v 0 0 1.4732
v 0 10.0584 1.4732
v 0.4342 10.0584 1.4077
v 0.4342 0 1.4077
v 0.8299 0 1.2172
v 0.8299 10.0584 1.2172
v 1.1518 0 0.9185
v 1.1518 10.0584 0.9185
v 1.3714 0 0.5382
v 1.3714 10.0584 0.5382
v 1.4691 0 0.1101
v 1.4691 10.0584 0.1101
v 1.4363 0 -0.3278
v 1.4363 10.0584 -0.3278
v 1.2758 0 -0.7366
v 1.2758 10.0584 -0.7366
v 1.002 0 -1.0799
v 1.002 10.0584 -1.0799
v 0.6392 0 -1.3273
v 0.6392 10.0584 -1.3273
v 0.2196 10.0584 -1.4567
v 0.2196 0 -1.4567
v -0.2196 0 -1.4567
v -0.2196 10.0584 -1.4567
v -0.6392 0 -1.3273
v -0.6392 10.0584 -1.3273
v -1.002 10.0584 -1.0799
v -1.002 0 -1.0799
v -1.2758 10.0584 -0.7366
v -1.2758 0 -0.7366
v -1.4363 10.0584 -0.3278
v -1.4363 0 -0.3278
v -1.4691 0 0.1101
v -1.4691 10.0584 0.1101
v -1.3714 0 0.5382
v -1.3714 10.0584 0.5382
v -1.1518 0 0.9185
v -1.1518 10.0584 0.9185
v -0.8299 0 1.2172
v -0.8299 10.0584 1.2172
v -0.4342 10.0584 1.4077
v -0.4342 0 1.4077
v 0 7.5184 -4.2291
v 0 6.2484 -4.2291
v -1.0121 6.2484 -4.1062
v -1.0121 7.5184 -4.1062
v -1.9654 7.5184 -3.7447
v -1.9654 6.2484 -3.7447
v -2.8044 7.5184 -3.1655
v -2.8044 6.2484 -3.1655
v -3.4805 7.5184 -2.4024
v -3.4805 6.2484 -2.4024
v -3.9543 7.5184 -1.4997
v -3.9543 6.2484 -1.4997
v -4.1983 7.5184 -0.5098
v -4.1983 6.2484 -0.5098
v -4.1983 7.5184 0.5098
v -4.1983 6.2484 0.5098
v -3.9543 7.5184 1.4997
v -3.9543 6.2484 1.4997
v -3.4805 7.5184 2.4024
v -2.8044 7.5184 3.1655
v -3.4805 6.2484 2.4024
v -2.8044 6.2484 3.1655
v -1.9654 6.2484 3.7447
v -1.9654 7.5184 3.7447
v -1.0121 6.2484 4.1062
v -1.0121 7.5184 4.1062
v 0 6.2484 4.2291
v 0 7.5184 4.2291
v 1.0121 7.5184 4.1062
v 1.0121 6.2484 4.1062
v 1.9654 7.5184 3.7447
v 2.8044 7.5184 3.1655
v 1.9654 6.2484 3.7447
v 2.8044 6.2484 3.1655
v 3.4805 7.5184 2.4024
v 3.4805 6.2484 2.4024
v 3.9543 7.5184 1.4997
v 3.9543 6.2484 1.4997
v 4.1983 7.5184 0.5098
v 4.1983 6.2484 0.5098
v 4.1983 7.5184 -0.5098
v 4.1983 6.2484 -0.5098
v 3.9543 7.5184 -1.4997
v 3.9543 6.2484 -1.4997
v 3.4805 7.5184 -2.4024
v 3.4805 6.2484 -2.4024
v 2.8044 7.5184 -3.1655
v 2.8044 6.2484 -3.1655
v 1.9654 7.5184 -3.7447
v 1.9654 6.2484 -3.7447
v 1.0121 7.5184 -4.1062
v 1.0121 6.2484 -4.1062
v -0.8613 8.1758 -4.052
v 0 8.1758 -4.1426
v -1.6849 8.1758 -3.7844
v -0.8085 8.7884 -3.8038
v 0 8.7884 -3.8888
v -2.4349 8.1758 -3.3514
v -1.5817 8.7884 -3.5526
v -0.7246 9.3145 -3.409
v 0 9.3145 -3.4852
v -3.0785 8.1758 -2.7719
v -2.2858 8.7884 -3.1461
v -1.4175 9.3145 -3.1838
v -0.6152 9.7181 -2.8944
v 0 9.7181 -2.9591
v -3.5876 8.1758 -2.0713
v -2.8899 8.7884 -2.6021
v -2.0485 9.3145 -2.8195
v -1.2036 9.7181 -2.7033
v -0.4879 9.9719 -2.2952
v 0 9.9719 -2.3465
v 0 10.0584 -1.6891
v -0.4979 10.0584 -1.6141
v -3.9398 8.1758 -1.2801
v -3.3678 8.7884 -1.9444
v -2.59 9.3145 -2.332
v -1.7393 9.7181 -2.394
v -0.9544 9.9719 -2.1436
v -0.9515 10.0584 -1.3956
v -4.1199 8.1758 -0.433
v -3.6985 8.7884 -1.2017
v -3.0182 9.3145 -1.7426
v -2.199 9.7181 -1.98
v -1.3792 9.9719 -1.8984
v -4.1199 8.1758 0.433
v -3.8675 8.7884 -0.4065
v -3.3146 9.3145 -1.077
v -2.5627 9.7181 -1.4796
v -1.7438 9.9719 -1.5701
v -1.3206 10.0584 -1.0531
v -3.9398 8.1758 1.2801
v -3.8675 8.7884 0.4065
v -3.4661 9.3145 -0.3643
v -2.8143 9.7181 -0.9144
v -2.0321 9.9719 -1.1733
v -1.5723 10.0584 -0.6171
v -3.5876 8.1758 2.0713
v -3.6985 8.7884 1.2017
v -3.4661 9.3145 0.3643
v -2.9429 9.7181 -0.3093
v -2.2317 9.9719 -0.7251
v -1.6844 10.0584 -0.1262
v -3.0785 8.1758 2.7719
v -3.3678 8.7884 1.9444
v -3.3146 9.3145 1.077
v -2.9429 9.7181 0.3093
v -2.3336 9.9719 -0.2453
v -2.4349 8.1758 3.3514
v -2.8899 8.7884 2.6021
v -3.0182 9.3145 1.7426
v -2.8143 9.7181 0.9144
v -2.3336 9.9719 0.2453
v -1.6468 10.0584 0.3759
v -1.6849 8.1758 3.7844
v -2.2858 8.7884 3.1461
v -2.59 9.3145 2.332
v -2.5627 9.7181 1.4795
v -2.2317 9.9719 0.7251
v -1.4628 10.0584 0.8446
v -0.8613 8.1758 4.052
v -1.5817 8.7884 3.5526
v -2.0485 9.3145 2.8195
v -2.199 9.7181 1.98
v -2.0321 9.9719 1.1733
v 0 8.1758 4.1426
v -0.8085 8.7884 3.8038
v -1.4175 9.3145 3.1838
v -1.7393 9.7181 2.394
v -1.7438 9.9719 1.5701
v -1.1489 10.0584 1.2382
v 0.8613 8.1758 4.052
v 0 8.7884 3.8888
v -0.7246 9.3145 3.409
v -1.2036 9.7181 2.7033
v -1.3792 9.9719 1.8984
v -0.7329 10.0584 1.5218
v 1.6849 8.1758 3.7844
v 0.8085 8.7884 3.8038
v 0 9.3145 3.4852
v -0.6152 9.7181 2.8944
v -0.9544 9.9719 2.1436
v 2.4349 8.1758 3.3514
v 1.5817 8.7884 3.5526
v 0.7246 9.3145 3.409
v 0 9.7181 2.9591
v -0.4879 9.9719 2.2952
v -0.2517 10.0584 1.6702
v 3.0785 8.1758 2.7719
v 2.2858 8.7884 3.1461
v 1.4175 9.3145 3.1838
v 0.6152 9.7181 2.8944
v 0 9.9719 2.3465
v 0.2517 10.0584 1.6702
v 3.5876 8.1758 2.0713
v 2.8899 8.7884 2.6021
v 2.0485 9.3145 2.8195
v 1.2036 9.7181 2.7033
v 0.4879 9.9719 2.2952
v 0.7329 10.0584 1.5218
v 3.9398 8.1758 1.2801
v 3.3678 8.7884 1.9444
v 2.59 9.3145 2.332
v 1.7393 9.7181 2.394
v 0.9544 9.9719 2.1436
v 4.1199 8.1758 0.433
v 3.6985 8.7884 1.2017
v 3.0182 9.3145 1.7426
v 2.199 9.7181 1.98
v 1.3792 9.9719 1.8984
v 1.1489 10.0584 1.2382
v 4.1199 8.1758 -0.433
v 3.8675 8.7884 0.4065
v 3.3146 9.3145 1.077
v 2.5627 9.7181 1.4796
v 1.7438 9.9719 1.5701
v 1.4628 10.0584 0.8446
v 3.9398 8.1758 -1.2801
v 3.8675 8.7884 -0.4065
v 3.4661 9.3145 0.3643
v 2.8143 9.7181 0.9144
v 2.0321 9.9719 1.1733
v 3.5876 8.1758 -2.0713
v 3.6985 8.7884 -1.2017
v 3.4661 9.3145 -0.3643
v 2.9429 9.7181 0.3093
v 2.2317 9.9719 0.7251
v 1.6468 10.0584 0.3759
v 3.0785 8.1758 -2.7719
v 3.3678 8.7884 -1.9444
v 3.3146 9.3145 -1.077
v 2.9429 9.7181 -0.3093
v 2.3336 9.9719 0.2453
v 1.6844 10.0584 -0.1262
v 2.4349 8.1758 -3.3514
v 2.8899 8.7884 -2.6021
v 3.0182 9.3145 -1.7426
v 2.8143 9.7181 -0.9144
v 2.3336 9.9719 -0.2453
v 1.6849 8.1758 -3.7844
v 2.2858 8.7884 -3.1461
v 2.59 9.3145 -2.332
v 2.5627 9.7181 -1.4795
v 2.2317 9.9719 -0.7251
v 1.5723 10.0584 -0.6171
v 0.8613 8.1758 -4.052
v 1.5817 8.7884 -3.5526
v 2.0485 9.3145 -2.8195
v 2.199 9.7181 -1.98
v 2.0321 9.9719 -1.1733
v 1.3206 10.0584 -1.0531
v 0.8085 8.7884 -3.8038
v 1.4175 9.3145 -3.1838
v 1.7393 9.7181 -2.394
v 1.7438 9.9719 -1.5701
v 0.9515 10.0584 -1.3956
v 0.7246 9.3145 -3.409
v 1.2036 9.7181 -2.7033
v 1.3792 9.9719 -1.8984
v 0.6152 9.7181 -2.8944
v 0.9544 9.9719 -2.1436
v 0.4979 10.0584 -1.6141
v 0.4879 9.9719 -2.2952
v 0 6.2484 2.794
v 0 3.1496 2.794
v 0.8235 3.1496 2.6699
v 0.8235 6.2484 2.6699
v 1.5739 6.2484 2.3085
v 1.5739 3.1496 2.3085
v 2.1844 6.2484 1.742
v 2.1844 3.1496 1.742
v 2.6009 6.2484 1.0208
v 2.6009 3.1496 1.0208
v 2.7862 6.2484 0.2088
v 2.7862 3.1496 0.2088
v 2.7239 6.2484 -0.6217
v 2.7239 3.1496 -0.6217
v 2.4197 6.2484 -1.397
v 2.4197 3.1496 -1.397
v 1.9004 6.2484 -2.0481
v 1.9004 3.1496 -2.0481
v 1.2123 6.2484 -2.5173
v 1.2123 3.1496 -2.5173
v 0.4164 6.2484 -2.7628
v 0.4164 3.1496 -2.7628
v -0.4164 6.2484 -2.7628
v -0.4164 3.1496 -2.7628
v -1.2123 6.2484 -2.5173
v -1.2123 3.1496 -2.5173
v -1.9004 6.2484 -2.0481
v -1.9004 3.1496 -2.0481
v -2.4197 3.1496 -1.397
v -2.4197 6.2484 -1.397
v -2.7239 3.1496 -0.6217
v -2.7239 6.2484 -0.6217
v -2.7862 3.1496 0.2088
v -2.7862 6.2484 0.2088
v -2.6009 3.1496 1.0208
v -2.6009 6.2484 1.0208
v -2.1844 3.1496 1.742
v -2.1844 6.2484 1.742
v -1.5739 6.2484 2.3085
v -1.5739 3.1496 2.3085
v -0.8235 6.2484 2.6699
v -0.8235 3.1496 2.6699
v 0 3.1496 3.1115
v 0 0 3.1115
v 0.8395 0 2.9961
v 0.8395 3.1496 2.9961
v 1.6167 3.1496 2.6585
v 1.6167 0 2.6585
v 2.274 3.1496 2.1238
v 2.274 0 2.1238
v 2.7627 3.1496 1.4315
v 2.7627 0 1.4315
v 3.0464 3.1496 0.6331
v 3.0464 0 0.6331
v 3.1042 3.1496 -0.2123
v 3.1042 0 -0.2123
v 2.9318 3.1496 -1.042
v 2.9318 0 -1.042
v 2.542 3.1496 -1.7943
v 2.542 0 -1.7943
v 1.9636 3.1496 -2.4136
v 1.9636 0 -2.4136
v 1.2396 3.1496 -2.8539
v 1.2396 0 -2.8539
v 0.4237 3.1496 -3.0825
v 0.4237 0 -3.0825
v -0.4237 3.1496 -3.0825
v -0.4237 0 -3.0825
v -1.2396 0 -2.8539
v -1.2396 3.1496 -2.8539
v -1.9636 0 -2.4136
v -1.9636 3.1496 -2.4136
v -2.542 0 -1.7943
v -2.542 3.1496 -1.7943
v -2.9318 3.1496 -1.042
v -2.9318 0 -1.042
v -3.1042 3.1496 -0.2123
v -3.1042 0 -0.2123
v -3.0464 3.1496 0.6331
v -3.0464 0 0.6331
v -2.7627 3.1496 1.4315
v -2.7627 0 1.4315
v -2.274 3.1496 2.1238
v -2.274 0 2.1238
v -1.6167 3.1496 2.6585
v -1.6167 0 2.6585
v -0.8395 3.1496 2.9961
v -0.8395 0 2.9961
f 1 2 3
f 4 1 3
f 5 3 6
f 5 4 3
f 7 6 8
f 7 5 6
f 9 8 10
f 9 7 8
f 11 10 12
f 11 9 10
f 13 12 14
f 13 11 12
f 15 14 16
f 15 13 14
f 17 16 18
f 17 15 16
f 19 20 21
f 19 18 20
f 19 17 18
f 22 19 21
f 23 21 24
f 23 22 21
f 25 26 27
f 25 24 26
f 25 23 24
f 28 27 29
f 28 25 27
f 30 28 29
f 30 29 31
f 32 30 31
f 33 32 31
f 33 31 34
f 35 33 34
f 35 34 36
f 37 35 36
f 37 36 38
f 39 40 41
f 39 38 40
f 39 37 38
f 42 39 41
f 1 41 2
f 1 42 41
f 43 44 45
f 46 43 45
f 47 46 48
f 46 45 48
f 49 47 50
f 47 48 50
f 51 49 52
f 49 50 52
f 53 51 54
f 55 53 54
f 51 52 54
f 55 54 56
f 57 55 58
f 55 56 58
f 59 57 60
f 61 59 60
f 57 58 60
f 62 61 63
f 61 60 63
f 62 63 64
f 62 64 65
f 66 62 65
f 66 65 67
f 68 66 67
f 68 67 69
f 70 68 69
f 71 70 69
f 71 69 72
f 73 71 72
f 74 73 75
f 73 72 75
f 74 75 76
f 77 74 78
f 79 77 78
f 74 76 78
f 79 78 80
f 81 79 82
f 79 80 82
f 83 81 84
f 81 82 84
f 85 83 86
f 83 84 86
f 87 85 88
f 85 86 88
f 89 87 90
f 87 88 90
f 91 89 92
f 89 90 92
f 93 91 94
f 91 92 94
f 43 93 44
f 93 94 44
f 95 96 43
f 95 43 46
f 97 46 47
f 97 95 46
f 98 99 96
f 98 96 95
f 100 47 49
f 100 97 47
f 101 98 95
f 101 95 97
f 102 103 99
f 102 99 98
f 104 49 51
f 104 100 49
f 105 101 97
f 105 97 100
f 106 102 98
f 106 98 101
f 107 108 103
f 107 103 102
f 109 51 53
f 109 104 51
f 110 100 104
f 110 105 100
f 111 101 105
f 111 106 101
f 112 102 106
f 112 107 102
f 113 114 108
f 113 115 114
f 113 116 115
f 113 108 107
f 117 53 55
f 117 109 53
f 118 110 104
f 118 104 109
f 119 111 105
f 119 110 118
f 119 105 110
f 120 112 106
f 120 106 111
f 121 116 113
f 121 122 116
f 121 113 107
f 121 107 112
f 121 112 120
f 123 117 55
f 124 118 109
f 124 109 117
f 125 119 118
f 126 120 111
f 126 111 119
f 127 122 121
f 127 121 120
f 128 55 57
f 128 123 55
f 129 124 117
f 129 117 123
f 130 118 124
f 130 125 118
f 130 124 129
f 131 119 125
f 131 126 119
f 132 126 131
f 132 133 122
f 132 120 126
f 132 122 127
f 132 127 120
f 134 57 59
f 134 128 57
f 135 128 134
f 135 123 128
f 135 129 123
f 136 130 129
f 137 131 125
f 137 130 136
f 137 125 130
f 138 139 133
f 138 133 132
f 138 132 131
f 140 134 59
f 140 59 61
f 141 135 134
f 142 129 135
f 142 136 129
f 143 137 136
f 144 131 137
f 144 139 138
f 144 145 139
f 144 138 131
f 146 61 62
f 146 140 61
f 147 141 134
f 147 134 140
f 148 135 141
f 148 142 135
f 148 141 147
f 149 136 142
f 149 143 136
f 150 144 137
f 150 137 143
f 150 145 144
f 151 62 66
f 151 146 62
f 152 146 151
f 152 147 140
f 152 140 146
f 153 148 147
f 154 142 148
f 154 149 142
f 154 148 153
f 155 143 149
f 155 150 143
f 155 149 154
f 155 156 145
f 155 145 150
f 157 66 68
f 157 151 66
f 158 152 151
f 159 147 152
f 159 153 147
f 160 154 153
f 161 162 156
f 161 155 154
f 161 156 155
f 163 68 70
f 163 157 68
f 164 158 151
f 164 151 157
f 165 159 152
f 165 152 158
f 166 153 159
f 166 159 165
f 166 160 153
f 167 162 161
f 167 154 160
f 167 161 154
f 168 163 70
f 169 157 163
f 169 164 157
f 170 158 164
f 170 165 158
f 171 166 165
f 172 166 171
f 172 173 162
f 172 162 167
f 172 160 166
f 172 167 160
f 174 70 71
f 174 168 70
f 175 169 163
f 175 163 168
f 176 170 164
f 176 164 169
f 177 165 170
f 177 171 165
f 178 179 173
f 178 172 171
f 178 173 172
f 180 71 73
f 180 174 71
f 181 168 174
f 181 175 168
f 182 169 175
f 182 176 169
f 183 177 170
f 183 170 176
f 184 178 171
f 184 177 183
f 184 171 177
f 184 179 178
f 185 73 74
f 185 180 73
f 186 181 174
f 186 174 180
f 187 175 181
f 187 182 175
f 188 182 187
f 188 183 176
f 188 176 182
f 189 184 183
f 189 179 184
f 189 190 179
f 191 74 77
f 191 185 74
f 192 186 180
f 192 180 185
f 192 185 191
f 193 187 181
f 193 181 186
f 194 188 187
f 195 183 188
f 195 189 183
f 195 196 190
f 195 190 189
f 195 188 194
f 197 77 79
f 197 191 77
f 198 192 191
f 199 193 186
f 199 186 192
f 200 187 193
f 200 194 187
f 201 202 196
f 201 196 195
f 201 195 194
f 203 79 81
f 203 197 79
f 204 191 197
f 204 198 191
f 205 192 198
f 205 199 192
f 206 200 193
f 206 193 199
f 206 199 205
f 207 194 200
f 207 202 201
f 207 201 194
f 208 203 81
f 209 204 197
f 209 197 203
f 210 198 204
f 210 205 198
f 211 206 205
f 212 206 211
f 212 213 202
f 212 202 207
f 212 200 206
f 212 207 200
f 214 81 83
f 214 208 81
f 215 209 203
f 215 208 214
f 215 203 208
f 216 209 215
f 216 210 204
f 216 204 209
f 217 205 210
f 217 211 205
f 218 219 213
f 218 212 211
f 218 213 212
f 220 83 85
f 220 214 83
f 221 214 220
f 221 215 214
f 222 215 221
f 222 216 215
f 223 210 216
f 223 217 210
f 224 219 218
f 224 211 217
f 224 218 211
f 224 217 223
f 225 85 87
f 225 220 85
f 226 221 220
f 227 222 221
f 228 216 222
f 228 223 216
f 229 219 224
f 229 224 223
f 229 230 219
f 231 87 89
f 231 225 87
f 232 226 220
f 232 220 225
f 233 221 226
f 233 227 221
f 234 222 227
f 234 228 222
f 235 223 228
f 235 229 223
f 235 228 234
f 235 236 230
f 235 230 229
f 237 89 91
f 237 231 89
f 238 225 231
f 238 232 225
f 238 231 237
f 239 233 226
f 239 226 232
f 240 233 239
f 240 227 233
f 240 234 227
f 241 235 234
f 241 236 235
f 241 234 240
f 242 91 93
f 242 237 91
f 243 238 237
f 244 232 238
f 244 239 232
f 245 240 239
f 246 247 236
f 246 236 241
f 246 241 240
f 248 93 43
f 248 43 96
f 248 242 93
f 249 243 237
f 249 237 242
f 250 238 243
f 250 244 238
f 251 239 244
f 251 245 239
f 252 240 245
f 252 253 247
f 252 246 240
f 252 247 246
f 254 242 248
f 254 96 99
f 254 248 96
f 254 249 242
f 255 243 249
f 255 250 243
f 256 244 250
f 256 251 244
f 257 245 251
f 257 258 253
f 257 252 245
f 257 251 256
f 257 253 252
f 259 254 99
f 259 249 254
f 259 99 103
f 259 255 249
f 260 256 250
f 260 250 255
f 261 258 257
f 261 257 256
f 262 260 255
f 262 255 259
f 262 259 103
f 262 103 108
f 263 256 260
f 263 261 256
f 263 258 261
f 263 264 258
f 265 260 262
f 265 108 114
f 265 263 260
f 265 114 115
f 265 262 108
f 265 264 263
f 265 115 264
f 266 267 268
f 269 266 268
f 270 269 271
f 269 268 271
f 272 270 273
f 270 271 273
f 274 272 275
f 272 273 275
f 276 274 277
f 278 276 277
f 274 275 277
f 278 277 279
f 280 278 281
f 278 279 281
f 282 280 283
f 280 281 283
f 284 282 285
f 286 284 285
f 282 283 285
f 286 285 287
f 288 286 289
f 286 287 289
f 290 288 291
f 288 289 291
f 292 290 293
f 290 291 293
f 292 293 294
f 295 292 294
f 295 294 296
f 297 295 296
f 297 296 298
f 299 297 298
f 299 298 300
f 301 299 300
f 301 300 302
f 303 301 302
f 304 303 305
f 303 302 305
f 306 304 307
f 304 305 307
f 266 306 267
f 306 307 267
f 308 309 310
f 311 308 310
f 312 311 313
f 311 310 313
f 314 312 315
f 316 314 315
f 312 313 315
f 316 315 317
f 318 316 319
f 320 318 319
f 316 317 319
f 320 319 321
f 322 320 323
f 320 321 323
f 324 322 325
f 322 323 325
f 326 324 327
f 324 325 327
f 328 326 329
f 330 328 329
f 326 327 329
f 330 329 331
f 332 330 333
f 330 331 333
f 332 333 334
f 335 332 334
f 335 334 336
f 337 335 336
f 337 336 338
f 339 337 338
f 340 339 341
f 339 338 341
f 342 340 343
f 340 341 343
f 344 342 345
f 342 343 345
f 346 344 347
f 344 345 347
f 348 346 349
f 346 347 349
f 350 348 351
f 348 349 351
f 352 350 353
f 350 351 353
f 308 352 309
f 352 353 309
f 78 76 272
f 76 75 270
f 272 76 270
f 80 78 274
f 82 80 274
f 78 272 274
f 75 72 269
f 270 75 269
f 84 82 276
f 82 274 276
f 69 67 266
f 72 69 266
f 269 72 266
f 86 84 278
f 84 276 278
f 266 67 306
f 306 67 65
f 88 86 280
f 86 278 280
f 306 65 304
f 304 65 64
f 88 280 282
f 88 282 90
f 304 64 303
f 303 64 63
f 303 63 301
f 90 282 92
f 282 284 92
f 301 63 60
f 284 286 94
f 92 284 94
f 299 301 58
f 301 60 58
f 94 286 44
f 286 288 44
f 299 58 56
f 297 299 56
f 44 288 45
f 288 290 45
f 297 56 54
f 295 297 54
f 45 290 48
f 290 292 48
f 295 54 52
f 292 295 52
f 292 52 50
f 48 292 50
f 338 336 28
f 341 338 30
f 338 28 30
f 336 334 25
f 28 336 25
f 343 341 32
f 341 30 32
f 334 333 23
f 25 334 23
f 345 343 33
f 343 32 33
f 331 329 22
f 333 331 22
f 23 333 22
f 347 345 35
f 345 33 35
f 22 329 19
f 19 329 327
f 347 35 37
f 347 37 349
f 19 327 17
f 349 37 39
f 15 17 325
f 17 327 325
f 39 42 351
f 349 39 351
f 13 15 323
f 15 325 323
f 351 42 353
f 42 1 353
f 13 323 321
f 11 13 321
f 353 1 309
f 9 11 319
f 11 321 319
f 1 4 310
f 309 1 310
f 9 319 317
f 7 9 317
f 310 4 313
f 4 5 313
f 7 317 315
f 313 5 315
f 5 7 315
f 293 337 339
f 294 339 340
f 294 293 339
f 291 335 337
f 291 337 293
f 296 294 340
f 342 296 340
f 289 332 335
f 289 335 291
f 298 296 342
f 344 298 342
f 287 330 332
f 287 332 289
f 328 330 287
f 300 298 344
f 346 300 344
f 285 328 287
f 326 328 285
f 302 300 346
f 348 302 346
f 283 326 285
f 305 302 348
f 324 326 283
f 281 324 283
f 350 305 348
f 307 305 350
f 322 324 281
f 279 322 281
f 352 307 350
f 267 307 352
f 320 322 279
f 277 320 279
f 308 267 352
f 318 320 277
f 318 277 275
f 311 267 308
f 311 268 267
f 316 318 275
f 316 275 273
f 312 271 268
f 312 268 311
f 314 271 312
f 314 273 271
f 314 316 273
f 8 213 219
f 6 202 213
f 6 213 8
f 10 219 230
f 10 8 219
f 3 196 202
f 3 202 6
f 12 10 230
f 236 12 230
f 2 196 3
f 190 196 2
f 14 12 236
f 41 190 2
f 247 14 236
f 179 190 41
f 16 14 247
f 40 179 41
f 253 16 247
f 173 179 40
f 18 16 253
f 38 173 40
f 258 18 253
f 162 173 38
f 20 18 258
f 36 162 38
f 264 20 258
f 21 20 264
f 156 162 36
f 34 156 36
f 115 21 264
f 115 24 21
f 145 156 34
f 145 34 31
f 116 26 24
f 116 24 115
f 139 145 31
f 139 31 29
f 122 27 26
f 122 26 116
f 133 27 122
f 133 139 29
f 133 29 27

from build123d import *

# Parameters (mm, degrees)
SKETCH1_R               = 3.1115
BOSS_EXTRUDE1_DEPTH     = 3.1496
SKETCH3_R               = 2.794
BOSS_EXTRUDE2_DEPTH     = 3.0988
SKETCH4_R               = 4.2291
BOSS_EXTRUDE3_DEPTH     = 3.81
CUT_EXTRUDE1_DEPTH      = 12.702221335
CUT_EXTRUDE1_DEPTH_BACK = 12.702221335
SKETCH5_R               = 1.4732
FILLET1_R               = 2.54


with BuildPart() as part:
    # Sketch1 → Boss-Extrude1 (new body)
    with BuildSketch(Plane(origin=(0, 0, 0), x_dir=(1, 0, 0), z_dir=(0, 1, 0))):
        with Locations(Location((0, 0, 0), (0, 0, 270))):
            Circle(SKETCH1_R)
    extrude(amount=BOSS_EXTRUDE1_DEPTH)

    # Sketch3 → Boss-Extrude2 (add)
    with BuildSketch(Plane(origin=(0, 3.1496, 0), x_dir=(1, 0, 0), z_dir=(0, 1, 0))):
        with Locations(Location((0, 0, 0), (0, 0, 270))):
            Circle(SKETCH3_R)
    extrude(amount=BOSS_EXTRUDE2_DEPTH)

    # Sketch4 → Boss-Extrude3 (add)
    with BuildSketch(Plane(origin=(0, 6.2484, 0), x_dir=(1, 0, 0), z_dir=(0, 1, 0))):
        with Locations(Location((0, 0, 0), (0, 0, 90))):
            Circle(SKETCH4_R)
    extrude(amount=BOSS_EXTRUDE3_DEPTH)

    # Sketch5 → Cut-Extrude1 (cut, two sides: drawn at the far end of the back side and taken through both)
    with BuildSketch(Plane(origin=(0, 10.0584, 0), x_dir=(1, 0, 0), z_dir=(0, 1, 0)).offset(-CUT_EXTRUDE1_DEPTH_BACK)):
        with Locations(Location((0, 0, 0), (0, 0, 270))):
            Circle(SKETCH5_R)
    extrude(amount=CUT_EXTRUDE1_DEPTH + CUT_EXTRUDE1_DEPTH_BACK, mode=Mode.SUBTRACT)

    # Fillet1
    fillet1_edges = [part.edges().sort_by_distance(p)[0] for p in [
        (0, 10.0584, 4.2291),
    ]]
    fillet(fillet1_edges, radius=FILLET1_R)


solid = part.part
